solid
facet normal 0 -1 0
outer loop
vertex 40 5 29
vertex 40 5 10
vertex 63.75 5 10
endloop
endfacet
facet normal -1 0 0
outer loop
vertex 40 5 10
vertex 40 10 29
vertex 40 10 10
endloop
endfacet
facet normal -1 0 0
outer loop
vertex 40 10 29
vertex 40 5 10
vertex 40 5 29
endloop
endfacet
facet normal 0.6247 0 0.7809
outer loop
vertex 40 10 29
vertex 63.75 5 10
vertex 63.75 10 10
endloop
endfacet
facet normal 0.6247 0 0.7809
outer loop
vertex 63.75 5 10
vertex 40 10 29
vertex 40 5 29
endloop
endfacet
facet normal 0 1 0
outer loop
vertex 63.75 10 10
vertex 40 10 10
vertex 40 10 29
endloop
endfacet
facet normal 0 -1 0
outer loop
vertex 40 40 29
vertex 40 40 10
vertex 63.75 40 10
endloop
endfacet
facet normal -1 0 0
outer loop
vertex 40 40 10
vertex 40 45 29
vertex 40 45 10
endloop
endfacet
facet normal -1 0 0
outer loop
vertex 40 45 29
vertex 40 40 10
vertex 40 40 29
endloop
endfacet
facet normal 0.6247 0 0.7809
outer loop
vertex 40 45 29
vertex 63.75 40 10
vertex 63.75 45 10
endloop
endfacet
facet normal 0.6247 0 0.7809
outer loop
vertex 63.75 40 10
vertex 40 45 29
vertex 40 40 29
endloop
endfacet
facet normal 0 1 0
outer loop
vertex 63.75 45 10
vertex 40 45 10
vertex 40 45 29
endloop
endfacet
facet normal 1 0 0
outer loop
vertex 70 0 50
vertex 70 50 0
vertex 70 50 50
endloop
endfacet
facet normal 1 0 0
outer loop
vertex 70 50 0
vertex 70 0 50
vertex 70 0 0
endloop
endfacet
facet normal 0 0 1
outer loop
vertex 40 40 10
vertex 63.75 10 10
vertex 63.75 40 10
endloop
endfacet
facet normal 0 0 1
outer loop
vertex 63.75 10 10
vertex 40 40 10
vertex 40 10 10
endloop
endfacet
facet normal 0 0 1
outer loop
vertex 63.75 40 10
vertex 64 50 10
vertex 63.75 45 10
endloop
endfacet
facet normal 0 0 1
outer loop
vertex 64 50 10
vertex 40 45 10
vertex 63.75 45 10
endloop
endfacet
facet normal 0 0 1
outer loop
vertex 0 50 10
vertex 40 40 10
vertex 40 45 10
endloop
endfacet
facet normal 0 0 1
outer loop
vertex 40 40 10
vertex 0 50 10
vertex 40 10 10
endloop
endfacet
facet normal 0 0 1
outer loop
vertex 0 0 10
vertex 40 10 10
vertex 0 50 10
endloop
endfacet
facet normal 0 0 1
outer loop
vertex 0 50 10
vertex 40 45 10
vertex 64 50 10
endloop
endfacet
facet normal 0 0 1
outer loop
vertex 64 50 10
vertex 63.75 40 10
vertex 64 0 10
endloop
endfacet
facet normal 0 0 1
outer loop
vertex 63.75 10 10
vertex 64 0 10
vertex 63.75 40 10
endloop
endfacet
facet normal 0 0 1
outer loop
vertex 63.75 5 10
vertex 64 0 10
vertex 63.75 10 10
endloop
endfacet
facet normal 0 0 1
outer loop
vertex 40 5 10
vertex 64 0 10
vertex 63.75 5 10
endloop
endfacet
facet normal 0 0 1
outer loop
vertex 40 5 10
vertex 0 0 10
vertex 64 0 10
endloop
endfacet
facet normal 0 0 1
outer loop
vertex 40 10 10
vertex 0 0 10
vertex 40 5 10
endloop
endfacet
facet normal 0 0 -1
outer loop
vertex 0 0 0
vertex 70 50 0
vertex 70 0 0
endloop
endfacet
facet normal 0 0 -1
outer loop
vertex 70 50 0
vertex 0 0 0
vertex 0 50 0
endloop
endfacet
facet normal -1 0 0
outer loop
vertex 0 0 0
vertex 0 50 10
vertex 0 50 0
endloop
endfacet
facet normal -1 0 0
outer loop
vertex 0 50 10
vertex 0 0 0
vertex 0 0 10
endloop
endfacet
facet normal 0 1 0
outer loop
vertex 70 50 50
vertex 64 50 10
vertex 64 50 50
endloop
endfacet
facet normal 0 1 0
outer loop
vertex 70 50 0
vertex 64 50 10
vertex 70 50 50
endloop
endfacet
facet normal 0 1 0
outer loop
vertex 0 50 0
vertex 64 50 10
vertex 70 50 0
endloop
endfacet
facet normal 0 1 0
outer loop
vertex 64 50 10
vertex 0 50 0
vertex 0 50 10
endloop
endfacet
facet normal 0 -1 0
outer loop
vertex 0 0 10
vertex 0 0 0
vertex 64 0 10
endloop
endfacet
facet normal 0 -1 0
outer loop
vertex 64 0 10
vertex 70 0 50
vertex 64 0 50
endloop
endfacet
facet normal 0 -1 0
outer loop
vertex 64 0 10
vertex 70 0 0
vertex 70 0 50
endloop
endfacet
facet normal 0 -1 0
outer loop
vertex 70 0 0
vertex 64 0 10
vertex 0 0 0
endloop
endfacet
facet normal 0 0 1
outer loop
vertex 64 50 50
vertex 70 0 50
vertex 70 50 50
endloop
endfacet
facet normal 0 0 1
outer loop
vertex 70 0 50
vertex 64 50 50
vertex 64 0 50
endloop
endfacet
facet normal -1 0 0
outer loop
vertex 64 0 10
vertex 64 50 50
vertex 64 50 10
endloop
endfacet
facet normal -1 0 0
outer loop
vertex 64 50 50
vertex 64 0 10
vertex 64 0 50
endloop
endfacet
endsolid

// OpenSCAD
$fn = 32;

// ----------------------------------------------------------------------
// Rib bracket: 2-gusset L bracket
// ----------------------------------------------------------------------

// --- parameters (mm) ---
base_l = 70;              // foot length, X
base_w = 50;              // foot width, Y
base_t = 10;              // foot thickness
plate_t = 6;              // upright plate thickness
plate_h = 50;             // overall height
gus_l = 24;               // gusset leg along the foot
gus_h = 20;               // gusset height
gus_t = 5;                // gusset thickness
gus_edge = 5;             // gusset margin from the foot edge
n_gus = 2;                // gusset count

gus_pitch = (base_w - 2 * gus_edge - gus_t) / (n_gus - 1);  // gusset pitch

union() {
  cube([base_l, base_w, base_t]);
  translate([base_l - plate_t, 0, base_t - 1])
    cube([plate_t, base_w, plate_h - base_t + 1]);
  for (i = [0 : n_gus - 1])
    translate([base_l - plate_t - gus_l, gus_edge + i * gus_pitch, base_t - 1])
      rotate([-90, 0, 0])
        linear_extrude(height = gus_t)
          polygon(points = [[0, 0], [gus_l + 1, 0], [0, -gus_h]]);
}
